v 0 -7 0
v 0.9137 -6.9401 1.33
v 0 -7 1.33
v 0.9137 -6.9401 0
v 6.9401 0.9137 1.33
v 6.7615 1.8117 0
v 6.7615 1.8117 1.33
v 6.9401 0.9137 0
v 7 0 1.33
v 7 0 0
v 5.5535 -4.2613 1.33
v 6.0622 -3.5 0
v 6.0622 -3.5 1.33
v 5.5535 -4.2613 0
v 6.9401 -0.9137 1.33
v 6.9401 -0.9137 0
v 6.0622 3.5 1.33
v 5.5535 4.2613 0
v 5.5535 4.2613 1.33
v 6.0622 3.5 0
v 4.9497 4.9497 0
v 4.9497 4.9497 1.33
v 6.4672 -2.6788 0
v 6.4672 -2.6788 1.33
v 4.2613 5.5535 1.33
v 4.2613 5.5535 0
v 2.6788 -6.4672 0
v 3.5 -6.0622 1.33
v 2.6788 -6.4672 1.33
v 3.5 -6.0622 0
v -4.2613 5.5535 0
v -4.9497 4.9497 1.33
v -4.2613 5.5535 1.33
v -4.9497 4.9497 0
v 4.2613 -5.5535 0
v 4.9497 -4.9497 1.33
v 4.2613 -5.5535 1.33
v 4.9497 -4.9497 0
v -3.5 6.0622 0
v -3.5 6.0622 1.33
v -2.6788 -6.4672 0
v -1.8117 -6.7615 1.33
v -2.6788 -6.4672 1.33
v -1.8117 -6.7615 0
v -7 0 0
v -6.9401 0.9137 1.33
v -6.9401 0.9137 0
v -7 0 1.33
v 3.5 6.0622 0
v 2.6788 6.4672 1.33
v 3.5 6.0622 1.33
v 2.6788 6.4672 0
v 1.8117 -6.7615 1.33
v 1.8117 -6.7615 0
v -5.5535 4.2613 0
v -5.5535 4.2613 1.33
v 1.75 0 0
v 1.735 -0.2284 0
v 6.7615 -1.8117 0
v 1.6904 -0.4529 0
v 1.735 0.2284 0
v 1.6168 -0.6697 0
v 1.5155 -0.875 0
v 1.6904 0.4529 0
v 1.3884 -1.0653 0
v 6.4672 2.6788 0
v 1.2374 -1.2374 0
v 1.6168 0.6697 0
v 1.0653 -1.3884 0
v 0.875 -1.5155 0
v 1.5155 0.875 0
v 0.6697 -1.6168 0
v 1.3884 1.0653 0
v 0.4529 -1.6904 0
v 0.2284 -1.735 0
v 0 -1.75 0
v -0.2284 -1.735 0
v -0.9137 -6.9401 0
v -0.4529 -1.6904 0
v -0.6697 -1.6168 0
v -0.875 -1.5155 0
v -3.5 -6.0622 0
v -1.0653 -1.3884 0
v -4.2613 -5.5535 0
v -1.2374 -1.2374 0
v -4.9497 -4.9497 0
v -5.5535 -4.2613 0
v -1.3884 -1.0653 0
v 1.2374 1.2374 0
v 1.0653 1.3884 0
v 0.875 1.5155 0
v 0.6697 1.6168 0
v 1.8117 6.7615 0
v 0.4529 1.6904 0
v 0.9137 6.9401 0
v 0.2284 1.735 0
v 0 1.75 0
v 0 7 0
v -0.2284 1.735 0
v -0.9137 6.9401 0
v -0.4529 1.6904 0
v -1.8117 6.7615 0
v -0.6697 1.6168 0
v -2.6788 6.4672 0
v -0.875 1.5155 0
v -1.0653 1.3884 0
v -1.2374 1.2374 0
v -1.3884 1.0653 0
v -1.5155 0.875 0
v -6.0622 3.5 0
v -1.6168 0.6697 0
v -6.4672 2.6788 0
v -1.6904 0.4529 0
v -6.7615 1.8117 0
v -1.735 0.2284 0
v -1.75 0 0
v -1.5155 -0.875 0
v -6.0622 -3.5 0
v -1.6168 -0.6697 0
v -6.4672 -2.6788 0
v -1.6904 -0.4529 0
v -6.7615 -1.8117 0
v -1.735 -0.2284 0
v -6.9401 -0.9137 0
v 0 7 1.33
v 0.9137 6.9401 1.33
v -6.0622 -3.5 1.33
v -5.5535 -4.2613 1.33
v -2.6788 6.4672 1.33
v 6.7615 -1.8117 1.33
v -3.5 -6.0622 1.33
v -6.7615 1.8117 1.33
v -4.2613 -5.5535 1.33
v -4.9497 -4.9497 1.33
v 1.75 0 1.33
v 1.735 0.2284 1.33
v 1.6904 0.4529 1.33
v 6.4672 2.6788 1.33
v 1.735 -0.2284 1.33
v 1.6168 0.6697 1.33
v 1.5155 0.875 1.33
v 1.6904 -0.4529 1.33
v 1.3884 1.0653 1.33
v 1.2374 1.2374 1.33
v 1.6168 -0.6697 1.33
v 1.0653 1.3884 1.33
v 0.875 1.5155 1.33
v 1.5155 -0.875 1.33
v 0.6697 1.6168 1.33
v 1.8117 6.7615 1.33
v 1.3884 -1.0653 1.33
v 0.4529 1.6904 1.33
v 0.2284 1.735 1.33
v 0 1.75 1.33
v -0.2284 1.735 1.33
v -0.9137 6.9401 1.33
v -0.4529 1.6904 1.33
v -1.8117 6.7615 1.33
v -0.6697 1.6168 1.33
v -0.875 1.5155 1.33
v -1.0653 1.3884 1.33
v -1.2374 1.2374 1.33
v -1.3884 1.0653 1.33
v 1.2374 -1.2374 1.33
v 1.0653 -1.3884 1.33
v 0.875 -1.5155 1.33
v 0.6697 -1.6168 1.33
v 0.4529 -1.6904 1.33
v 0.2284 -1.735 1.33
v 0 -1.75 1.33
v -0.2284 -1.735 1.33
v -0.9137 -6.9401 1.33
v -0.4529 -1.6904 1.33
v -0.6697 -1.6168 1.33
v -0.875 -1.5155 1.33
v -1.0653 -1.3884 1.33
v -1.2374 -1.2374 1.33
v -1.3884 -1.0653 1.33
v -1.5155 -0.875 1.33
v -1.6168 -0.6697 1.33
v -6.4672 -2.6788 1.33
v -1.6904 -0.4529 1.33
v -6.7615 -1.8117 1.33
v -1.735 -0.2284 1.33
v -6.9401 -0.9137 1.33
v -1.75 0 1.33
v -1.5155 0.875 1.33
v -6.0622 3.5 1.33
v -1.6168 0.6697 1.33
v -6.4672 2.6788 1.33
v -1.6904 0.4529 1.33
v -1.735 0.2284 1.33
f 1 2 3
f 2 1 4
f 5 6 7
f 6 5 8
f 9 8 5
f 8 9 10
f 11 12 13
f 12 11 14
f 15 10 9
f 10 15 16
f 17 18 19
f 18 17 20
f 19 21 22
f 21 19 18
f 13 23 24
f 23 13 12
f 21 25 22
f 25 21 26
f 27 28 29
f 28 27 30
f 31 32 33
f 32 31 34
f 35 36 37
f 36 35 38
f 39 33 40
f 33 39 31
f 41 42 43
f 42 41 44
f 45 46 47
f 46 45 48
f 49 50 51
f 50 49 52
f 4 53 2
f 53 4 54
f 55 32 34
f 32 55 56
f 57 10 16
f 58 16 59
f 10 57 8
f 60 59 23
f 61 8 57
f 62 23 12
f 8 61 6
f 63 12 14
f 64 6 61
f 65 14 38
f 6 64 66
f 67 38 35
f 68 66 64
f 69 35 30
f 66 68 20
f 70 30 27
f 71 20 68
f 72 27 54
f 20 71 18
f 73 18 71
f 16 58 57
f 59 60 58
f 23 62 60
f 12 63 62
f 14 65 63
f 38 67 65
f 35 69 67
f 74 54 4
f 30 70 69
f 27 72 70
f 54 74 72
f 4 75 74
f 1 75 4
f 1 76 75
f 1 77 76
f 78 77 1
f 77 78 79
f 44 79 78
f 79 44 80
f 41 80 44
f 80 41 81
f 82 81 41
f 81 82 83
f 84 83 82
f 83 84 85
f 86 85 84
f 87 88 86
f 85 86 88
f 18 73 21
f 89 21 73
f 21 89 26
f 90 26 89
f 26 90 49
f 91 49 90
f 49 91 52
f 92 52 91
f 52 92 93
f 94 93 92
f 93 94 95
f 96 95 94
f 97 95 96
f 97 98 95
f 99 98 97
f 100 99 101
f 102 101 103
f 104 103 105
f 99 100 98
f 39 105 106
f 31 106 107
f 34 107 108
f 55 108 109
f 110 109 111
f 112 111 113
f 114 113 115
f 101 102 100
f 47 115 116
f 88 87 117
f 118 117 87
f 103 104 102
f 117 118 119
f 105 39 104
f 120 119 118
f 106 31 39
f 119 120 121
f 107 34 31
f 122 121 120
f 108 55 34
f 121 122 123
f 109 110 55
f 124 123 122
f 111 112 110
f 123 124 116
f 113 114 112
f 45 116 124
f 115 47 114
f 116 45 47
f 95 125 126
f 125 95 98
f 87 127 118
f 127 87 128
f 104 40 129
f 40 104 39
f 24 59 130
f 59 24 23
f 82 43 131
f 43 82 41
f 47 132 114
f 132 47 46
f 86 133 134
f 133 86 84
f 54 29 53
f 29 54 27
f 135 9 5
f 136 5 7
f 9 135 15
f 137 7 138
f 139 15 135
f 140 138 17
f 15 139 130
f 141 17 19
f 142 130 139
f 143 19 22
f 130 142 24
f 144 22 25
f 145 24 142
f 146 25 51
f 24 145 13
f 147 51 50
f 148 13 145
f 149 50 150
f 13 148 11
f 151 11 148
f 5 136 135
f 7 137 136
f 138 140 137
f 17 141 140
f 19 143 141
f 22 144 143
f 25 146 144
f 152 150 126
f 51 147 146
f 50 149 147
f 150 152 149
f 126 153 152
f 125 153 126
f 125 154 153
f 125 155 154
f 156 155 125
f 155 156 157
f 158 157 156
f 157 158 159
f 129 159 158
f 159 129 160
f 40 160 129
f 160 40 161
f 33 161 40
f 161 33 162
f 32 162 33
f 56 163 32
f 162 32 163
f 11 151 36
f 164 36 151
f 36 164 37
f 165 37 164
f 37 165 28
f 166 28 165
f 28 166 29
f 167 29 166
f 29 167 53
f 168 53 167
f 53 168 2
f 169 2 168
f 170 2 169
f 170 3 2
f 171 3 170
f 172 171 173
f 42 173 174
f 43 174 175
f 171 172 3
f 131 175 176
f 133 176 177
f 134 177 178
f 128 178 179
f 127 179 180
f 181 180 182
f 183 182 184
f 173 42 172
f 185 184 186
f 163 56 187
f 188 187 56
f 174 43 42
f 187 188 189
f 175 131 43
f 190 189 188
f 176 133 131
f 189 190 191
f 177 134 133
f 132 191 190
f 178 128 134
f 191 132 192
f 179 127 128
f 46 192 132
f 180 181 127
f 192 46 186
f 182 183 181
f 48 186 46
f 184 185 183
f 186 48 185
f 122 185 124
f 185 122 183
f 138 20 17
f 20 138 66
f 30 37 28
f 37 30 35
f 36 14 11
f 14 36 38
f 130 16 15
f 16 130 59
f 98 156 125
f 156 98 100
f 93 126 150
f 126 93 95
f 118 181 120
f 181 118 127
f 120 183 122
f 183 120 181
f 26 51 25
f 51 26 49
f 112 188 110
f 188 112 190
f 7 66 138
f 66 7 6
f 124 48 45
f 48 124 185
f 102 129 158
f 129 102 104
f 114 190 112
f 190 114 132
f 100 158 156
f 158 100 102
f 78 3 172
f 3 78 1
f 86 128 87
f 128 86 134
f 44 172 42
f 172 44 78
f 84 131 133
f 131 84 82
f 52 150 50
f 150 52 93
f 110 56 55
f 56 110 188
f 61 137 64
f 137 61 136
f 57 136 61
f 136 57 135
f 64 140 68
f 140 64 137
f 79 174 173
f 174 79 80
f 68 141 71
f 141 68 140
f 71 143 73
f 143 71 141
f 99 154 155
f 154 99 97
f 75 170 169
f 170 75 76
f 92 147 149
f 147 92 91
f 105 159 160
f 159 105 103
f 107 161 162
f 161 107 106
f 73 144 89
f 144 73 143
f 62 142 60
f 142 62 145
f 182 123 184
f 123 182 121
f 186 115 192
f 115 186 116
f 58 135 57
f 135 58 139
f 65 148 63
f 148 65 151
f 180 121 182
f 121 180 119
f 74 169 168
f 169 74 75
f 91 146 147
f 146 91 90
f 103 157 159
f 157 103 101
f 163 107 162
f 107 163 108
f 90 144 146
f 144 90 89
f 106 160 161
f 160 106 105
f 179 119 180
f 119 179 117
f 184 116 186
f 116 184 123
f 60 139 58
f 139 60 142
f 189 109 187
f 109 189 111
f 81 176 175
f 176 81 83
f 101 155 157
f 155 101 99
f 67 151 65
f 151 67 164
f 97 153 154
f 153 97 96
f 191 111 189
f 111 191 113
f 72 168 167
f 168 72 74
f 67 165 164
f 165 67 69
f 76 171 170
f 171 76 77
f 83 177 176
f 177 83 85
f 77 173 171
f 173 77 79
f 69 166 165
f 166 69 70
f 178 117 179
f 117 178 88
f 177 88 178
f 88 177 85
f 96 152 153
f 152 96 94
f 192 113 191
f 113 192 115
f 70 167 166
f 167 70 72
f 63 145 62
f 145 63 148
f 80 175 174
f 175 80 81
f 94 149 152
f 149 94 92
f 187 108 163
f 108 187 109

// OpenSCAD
// file: parameters.scad
// =============================================================================
// Gen-AA Vernier flux-claw dual nano-gap — WOUND-AWARE (HARD GATE)
// Improve Gen-X: tighter m2m ≤6.4, more copper (145 t), run_clear 0.70
// =============================================================================

wire_awg            = 26;
wire_od             = 0.45;
turns               = 145;      // +10 vs Gen-X 135
fill                = 0.70;
layers_per_face     = 2;
wind_build_axial    = layers_per_face * wire_od * fill;   // 0.63
wind_build_radial   = 3 * wire_od * fill;                 // 0.945

coil_id_r           = 21.5;
coil_od_r           = 58.0;
span_deg            = 25.0;     // 12 stations; vernier vs 16-pole equiv
former_web          = 2.0;
flange_t            = 0.75;
wall                = 1.2;
slot_w              = 2.4;
mount_hole          = 3.5;
tab_len             = 7.0;

former_bare_h       = former_web + 2 * flange_t;            // 3.5
coil_envelope_h     = former_bare_h + 2 * wind_build_axial; // 4.76

run_clear           = 0.70;
gap_spacer_h        = run_clear + wind_build_axial;         // 1.33
m2m                 = coil_envelope_h + 2 * run_clear;      // 6.16 (beats Gen-X 6.76; ≤6.4 target)

coil_stations       = 12;
bay_r_in            = coil_id_r - 2.0 - wind_build_radial;
bay_r_out           = coil_od_r + 2.0 + wind_build_radial;
bay_span            = span_deg + 4.0;
bay_offset          = 2.0;
stator_thick        = former_bare_h;
stator_od           = 156.0;
shaft_clear_stator  = 36.0;
coil_mount_r        = 28.0;

// Dual rotors: 8+8 Ø20 vernier poles + 24+24 Ø5 flux claws / edge assists
large_pocket_d      = 20.3;
small_pocket_d      = 5.3;
pocket_h            = 5.2;
large_n             = 8;
R_large             = 50.0;
R_small_inner       = 36.0;     // claw inner
R_small_mid         = 50.0;
R_small_outer       = 64.0;
carrier_od          = 152.0;
carrier_thick       = 7.5;
hub_h               = 10.0;
hub_od              = 30.0;
rotor_b_offset_deg  = 22.5;     // vernier offset

shaft_bore          = 8.35;
bearing_d           = 21.85;
bearing_h           = 7.2;
m3_clear            = 3.5;
bolt_r_inner        = 36.0;
bolt_n_inner        = 6;
flange_bolt_r       = 72.0;
flange_bolt_n       = 6;
brace_r             = 68.0;
brace_d             = 4.3;
brace_n             = 4;

spacer_pad_od       = 14.0;
spacer_pad_id       = m3_clear;
endbell_od          = 156.0;
endbell_thick       = 8.0;
endbell_shaft_clear = 10.0;

$fn = 64;
// main file
// Gen-AA gap spacer — h = run_clear + wind_build_axial; print ×12
include <parameters.scad>;
$fn = 48;
difference() {
    cylinder(d=spacer_pad_od, h=gap_spacer_h);
    translate([0, 0, -0.1]) cylinder(d=spacer_pad_id, h=gap_spacer_h + 0.2);
}
